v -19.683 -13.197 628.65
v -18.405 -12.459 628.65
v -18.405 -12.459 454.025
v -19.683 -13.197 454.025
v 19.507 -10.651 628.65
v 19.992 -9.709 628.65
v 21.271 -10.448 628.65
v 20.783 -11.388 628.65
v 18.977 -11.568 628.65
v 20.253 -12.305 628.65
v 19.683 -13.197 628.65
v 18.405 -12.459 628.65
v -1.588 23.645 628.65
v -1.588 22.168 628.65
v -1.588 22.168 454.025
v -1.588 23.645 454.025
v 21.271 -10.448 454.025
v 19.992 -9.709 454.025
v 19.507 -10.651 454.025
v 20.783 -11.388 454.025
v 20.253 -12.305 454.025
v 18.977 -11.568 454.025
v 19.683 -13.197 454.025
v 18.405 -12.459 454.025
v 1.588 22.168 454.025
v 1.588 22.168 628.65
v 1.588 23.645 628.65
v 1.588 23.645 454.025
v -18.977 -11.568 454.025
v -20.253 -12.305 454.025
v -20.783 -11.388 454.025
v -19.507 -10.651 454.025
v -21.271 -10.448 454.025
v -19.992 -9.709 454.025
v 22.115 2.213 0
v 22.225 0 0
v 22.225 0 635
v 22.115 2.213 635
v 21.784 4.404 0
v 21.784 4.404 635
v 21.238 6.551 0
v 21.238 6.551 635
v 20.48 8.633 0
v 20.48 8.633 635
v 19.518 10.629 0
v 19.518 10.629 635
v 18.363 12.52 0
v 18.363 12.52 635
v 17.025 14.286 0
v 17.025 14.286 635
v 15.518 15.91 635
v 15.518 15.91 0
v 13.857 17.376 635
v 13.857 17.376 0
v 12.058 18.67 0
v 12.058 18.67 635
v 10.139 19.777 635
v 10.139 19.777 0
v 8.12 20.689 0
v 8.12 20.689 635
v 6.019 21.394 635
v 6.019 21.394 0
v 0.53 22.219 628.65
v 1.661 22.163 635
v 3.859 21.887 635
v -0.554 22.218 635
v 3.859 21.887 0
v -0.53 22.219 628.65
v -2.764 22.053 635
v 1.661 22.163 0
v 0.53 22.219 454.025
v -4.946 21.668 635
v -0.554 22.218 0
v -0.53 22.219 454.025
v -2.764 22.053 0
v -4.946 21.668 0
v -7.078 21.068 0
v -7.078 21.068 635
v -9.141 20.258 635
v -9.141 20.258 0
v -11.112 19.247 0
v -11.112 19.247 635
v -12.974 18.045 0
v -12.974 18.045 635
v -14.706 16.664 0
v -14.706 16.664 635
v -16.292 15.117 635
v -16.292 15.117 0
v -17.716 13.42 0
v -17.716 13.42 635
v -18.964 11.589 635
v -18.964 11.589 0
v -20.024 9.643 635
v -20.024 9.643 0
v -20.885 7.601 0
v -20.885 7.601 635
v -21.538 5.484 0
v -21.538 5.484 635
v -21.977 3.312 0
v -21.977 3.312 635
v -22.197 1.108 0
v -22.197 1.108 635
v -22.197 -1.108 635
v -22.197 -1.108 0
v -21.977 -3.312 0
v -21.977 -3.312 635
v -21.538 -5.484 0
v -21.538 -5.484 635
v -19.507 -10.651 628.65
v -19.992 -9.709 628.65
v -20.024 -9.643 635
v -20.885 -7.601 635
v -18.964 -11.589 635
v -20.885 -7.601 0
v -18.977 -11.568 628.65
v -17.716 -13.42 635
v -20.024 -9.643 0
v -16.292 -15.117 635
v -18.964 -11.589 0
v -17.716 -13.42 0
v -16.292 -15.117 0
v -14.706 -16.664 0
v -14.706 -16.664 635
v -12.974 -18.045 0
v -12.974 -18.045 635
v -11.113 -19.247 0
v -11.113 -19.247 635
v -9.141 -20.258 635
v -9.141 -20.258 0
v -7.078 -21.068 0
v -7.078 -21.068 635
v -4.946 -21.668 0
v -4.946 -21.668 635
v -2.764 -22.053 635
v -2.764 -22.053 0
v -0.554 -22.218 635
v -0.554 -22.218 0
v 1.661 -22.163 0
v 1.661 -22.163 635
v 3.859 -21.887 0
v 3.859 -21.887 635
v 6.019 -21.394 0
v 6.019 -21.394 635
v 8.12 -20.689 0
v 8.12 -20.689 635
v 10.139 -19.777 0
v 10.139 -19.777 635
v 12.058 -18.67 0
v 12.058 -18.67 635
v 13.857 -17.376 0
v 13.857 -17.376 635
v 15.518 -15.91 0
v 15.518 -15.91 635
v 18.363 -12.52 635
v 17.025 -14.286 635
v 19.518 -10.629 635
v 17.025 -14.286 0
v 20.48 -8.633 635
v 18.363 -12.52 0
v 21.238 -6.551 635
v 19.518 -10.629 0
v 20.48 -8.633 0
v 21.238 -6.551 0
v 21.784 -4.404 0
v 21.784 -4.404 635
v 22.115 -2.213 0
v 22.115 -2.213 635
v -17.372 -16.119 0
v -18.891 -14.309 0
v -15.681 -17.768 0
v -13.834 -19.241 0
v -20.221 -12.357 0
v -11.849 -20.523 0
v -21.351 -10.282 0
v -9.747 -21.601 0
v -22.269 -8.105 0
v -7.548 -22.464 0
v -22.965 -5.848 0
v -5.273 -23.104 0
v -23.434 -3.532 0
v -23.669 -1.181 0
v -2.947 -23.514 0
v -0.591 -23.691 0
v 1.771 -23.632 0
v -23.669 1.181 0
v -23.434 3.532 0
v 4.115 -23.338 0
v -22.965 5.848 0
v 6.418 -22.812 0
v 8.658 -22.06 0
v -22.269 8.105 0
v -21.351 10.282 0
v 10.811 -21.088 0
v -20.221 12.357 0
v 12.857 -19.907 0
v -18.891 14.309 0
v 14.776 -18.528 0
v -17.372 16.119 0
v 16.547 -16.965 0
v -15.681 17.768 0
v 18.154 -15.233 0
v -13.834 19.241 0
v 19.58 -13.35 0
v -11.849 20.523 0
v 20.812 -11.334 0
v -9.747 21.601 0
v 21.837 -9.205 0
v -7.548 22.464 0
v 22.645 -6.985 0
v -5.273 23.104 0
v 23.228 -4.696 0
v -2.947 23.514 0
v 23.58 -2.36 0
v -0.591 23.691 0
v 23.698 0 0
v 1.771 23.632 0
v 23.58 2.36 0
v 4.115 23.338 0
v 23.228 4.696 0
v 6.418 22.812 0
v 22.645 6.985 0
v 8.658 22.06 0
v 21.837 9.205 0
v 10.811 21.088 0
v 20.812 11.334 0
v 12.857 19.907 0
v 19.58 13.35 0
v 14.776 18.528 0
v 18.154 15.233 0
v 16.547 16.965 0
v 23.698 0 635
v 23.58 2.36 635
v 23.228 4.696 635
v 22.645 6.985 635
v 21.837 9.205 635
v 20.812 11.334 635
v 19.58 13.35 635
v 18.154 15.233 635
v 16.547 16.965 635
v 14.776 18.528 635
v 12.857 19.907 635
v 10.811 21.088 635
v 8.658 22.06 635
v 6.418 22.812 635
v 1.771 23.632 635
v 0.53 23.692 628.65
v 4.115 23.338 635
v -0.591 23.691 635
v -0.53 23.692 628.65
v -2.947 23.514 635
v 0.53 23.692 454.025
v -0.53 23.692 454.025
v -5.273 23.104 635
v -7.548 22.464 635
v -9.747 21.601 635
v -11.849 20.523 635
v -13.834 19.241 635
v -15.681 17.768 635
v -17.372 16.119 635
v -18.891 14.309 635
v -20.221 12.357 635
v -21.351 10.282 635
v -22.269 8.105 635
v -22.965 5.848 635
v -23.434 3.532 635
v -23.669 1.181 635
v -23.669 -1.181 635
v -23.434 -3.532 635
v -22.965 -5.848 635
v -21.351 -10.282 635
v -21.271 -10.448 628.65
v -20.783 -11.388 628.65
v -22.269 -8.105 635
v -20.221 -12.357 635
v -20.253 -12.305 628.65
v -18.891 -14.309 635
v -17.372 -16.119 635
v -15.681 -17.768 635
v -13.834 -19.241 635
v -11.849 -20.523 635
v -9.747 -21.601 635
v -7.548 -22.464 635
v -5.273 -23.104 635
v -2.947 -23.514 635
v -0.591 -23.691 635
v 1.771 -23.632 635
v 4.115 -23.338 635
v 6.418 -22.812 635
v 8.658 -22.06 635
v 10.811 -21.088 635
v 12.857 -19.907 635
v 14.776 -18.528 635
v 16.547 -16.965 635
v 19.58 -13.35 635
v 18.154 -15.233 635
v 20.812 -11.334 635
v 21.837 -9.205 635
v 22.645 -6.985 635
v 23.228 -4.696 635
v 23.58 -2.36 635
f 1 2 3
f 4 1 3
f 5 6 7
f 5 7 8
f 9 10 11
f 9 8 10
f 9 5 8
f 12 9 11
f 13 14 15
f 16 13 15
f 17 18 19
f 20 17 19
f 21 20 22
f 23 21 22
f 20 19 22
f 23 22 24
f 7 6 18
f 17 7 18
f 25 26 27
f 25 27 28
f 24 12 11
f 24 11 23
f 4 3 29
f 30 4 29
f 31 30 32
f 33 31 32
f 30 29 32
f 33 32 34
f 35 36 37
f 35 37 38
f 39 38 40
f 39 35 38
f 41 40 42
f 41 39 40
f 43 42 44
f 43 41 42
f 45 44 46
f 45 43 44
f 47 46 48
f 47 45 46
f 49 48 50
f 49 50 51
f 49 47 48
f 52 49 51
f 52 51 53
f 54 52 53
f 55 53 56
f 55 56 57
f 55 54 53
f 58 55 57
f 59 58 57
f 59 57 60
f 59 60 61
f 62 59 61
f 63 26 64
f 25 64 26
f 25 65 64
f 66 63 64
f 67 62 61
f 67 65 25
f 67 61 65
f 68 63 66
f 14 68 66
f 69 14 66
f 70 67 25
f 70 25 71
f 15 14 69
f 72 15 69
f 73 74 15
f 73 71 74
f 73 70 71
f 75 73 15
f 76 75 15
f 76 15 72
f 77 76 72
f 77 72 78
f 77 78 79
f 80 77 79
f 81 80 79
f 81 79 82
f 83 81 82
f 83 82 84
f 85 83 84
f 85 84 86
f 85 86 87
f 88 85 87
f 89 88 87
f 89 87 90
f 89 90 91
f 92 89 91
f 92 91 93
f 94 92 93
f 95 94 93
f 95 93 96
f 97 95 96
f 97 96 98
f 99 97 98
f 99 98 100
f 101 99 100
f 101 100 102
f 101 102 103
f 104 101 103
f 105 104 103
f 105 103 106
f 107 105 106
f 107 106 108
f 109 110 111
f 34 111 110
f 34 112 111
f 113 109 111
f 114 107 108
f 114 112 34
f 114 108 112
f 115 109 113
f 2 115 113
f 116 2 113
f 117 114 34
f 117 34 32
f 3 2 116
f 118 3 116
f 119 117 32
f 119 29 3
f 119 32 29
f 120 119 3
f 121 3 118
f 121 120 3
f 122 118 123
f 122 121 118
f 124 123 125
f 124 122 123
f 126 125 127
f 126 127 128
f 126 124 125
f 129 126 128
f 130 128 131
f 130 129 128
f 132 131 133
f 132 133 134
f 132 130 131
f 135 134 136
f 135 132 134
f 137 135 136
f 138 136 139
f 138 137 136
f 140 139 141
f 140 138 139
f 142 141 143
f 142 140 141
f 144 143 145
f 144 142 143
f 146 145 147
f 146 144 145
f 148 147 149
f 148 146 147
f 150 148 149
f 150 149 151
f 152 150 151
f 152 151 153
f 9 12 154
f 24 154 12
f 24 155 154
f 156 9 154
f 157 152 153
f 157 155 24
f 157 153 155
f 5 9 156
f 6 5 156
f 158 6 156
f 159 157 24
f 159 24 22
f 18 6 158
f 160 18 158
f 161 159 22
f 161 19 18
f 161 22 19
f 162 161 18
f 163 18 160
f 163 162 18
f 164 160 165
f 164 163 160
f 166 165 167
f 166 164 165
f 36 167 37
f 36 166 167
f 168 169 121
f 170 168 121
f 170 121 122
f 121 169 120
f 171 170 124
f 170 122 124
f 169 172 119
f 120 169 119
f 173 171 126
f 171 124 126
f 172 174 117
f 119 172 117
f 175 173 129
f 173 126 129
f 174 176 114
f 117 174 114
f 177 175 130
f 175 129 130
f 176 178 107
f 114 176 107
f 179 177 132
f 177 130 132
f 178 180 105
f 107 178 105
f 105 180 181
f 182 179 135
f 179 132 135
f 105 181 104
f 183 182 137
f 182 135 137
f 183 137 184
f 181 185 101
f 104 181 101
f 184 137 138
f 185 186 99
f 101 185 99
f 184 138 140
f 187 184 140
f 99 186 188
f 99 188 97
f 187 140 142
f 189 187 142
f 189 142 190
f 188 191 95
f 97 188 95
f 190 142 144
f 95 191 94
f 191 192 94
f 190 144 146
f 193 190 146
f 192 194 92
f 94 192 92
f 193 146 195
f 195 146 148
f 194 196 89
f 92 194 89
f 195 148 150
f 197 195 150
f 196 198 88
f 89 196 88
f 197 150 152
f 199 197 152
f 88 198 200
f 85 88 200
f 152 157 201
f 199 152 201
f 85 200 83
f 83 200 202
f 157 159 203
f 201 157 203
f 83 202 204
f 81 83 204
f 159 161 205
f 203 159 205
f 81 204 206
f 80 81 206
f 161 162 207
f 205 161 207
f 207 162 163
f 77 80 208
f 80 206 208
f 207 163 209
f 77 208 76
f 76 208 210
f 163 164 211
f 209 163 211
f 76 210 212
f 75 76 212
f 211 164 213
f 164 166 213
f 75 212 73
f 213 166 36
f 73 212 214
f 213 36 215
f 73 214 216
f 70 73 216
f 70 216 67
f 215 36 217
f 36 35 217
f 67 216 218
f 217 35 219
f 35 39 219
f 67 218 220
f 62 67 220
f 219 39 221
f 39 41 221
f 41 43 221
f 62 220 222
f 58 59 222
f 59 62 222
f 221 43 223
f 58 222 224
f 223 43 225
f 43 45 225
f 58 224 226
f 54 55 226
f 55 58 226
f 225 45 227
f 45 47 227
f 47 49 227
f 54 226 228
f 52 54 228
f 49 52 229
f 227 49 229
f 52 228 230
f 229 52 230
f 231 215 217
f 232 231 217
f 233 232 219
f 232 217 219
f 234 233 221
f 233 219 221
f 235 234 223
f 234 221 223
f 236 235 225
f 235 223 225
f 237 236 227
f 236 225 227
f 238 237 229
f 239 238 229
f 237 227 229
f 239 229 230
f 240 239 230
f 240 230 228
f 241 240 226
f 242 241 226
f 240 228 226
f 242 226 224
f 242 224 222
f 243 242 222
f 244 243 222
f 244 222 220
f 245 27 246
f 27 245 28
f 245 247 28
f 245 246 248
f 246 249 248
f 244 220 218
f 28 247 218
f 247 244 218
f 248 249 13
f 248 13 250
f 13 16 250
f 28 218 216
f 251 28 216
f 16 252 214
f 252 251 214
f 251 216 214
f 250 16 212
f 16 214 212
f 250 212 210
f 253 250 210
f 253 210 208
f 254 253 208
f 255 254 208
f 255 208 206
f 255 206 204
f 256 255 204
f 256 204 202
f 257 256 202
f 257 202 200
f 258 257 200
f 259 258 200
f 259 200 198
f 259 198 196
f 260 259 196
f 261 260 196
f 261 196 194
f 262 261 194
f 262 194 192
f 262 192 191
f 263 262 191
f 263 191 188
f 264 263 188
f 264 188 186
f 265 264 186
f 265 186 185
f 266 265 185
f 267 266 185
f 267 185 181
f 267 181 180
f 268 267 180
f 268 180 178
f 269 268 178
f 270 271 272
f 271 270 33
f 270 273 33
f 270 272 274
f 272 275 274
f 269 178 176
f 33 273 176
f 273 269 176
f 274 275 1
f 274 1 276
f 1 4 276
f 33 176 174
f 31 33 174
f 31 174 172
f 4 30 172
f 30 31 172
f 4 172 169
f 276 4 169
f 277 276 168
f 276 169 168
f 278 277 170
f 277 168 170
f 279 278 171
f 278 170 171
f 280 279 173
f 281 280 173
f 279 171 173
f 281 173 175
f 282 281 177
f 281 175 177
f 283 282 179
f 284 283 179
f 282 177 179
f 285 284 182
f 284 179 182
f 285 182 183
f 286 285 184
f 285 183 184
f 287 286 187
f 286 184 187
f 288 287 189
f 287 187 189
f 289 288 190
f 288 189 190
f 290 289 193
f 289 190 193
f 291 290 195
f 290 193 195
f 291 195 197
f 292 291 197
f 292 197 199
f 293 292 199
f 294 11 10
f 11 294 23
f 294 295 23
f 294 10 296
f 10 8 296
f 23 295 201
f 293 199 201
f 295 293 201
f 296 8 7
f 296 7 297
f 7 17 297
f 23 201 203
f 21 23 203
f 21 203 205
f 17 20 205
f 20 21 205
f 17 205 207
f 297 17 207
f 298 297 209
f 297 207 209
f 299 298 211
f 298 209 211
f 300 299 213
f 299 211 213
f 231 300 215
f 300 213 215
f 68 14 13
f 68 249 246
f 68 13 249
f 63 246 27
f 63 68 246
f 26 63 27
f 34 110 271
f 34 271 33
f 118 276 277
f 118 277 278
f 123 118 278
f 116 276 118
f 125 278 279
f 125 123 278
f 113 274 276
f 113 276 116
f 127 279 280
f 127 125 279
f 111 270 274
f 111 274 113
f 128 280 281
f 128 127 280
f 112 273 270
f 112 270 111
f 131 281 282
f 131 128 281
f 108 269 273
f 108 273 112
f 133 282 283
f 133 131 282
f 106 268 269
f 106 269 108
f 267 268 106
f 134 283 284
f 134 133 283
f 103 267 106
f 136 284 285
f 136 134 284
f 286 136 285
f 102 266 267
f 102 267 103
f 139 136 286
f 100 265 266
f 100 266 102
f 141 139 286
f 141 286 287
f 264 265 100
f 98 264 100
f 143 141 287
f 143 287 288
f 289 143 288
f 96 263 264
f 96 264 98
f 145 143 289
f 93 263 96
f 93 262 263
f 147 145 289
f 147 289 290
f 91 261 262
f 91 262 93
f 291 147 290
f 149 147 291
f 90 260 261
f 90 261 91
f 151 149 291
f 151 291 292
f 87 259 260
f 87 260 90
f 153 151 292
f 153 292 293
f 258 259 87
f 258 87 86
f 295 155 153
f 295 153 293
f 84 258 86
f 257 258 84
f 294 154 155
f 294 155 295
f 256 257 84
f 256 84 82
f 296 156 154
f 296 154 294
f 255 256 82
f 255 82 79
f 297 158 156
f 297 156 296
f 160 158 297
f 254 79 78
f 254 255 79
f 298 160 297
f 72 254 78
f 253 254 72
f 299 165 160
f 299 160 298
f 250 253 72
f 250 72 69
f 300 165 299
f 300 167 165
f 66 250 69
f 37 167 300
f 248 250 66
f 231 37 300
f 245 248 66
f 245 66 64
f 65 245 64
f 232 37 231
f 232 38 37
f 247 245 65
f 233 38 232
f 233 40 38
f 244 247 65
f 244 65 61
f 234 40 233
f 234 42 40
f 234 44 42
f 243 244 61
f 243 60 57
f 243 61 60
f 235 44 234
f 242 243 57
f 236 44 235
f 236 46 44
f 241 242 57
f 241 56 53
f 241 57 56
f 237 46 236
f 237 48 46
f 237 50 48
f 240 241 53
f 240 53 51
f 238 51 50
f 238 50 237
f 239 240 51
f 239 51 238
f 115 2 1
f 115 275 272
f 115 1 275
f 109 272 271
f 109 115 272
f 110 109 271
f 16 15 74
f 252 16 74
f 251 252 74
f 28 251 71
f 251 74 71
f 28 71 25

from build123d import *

# Parameters (mm, degrees)
SKETCH1_R           = 23.6982
SKETCH1_R_2         = 22.225
BOSS_EXTRUDE1_DEPTH = 635
CUT_EXTRUDE2_START  = -28.631769
SKETCH3_W           = 3.175
SKETCH3_H           = 174.625
CUT_EXTRUDE2_DEPTH  = 1.529969
CIRPATTERN4_COUNT   = 3


with BuildPart() as part:
    # Sketch1 → Boss-Extrude1 (new body)
    with BuildSketch(Plane.XY):
        Circle(SKETCH1_R)
        Circle(SKETCH1_R_2, mode=Mode.SUBTRACT)
    extrude(amount=BOSS_EXTRUDE1_DEPTH)

    # Sketch3 → Cut-Extrude2 (cut)
    with BuildSketch(Plane(origin=(0, 50.8, 0), x_dir=(1, 0, 0), z_dir=(0, 1, 0)).offset(CUT_EXTRUDE2_START)):
        with Locations((0, -541.3375)):
            Rectangle(SKETCH3_W, SKETCH3_H)
    cut_extrude2 = extrude(amount=CUT_EXTRUDE2_DEPTH, mode=Mode.SUBTRACT)

    # CirPattern4: Cut-Extrude2 ×3 about axis
    cirpattern4_axis = Axis((0, 0, 0), (0, 0, 1))
    for i in range(1, CIRPATTERN4_COUNT):
        add(cut_extrude2.rotate(cirpattern4_axis, i * 360 / CIRPATTERN4_COUNT), mode=Mode.SUBTRACT)


solid = part.part
